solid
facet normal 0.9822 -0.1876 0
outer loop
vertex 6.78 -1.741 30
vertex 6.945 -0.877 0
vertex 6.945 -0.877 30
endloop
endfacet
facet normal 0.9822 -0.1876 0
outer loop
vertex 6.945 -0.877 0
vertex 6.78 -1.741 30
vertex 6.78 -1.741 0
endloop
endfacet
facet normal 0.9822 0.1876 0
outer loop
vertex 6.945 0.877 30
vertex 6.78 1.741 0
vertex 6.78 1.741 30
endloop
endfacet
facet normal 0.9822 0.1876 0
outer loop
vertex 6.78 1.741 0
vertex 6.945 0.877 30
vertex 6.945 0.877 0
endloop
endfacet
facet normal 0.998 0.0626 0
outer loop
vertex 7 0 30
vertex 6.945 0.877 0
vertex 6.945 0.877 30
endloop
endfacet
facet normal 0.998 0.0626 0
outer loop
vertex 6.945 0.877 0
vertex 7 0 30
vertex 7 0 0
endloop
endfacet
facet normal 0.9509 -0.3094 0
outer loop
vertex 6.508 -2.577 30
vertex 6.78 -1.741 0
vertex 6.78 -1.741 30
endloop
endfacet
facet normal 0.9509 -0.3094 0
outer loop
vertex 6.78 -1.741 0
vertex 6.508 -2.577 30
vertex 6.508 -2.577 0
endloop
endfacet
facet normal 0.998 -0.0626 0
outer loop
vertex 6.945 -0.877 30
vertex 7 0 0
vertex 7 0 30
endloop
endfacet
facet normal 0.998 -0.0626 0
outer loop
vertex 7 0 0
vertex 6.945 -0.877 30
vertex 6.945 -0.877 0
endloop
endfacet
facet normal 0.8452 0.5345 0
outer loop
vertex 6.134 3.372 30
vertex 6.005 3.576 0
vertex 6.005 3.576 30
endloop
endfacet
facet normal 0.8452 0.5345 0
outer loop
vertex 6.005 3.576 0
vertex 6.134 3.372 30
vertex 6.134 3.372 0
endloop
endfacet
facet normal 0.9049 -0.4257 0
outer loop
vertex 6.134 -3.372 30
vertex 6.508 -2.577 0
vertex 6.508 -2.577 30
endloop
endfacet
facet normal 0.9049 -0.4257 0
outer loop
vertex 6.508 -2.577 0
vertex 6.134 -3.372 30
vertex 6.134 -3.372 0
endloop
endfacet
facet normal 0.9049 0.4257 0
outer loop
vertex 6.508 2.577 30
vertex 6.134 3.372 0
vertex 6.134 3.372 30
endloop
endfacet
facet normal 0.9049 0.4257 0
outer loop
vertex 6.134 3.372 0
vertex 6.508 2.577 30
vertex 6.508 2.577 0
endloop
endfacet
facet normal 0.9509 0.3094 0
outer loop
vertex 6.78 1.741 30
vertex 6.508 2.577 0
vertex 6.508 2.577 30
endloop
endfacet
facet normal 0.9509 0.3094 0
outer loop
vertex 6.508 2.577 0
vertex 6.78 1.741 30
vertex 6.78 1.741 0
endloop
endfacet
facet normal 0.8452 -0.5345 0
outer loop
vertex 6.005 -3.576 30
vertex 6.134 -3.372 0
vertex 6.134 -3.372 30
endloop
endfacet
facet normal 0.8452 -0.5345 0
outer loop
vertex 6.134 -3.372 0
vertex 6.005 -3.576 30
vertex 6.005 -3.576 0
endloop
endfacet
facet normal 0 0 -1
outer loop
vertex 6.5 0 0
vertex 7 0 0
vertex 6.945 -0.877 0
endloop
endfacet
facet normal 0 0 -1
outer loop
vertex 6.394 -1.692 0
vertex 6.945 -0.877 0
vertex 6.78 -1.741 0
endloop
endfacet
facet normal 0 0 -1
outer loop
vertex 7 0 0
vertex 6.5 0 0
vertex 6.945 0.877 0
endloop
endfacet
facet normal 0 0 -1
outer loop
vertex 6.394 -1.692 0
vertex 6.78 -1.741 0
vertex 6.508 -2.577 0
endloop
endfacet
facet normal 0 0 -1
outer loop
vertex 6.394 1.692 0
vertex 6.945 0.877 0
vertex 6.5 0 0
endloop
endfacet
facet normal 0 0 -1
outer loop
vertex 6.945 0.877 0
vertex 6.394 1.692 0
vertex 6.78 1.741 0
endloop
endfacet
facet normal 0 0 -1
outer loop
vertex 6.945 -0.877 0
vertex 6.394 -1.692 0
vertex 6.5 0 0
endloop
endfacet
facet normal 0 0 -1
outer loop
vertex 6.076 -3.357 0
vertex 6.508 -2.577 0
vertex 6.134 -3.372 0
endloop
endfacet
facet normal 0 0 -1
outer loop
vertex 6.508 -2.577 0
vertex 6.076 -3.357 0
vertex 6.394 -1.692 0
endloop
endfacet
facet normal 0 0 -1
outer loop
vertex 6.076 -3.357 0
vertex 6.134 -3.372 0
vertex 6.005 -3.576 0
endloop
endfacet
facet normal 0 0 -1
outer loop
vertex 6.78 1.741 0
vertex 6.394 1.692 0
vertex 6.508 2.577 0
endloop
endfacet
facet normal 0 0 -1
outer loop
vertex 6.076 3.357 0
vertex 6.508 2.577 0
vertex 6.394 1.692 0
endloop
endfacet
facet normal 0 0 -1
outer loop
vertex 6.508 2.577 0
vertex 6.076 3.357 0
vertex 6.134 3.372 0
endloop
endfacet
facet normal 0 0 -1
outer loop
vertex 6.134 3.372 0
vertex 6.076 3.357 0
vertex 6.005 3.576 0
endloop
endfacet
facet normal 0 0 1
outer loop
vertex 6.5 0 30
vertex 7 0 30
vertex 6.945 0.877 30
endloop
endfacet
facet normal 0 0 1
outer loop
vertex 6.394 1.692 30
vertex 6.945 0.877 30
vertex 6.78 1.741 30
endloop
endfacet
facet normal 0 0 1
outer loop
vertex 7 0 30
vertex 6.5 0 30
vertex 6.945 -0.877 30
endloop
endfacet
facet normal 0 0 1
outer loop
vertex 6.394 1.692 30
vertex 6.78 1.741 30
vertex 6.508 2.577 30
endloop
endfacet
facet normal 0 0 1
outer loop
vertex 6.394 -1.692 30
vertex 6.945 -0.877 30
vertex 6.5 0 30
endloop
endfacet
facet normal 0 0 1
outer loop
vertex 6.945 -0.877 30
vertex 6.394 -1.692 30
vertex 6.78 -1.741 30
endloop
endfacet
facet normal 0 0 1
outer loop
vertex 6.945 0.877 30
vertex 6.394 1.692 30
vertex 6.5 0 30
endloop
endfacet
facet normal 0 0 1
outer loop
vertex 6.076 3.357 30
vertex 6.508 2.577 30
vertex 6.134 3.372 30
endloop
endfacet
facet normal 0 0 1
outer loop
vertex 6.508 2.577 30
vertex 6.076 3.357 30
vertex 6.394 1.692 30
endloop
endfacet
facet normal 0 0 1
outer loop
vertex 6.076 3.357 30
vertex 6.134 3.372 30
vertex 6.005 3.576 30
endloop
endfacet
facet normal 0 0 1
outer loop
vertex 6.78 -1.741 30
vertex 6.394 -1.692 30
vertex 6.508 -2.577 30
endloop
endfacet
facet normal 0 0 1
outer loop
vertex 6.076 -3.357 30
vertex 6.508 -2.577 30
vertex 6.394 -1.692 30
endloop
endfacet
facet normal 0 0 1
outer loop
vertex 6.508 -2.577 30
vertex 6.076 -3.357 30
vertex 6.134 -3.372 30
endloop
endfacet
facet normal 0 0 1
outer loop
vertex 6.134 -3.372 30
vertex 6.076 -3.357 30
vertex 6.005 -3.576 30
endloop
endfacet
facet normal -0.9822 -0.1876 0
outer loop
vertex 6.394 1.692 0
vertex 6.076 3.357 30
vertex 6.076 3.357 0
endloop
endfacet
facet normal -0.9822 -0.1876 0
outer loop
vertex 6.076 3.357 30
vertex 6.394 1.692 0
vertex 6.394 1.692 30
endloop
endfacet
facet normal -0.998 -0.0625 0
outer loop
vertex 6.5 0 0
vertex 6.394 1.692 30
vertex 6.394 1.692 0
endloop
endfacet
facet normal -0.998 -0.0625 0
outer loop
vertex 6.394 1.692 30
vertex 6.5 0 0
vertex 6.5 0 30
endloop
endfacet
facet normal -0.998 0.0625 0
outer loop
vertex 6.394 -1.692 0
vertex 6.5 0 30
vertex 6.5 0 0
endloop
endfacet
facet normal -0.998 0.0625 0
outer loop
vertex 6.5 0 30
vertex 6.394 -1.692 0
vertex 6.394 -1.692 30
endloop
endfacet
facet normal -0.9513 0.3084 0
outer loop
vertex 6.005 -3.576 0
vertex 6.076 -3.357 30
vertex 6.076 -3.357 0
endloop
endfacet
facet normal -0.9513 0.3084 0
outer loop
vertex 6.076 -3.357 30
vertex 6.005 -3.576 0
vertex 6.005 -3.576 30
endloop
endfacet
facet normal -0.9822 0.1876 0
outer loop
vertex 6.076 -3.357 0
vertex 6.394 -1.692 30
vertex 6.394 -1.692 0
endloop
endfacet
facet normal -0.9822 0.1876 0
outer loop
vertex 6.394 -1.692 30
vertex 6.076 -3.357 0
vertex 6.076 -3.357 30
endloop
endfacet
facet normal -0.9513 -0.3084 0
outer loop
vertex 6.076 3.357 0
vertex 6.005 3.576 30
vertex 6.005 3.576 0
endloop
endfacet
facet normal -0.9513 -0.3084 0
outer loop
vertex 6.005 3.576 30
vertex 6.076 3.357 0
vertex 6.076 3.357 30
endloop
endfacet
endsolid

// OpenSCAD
$fn = 50;


difference() {
	union() {
		cylinder(h = 30, r = 7.0000000000);
		translate(v = [-10.0000000000, 0, 0]) {
			cylinder(h = 30, r = 7.0000000000);
		}
	}
	union() {
		cylinder(h = 30, r = 3.2500000000);
		cylinder(h = 30, r = 1.8000000000);
		cylinder(h = 30, r = 1.8000000000);
		cylinder(h = 30, r = 1.8000000000);
		translate(v = [-14.5000000000, 0, 0]) {
			hull() {
				translate(v = [-3.7500000000, 0.0000000000, 0]) {
					cylinder(h = 30, r = 7.5000000000);
				}
				translate(v = [3.7500000000, 0.0000000000, 0]) {
					cylinder(h = 30, r = 7.5000000000);
				}
				translate(v = [-3.7500000000, -0.0000000000, 0]) {
					cylinder(h = 30, r = 7.5000000000);
				}
				translate(v = [3.7500000000, -0.0000000000, 0]) {
					cylinder(h = 30, r = 7.5000000000);
				}
			}
		}
		translate(v = [-7.0000000000, 0, 0.0000000000]) {
			cylinder(h = 30, r = 13.5000000000);
		}
	}
}
